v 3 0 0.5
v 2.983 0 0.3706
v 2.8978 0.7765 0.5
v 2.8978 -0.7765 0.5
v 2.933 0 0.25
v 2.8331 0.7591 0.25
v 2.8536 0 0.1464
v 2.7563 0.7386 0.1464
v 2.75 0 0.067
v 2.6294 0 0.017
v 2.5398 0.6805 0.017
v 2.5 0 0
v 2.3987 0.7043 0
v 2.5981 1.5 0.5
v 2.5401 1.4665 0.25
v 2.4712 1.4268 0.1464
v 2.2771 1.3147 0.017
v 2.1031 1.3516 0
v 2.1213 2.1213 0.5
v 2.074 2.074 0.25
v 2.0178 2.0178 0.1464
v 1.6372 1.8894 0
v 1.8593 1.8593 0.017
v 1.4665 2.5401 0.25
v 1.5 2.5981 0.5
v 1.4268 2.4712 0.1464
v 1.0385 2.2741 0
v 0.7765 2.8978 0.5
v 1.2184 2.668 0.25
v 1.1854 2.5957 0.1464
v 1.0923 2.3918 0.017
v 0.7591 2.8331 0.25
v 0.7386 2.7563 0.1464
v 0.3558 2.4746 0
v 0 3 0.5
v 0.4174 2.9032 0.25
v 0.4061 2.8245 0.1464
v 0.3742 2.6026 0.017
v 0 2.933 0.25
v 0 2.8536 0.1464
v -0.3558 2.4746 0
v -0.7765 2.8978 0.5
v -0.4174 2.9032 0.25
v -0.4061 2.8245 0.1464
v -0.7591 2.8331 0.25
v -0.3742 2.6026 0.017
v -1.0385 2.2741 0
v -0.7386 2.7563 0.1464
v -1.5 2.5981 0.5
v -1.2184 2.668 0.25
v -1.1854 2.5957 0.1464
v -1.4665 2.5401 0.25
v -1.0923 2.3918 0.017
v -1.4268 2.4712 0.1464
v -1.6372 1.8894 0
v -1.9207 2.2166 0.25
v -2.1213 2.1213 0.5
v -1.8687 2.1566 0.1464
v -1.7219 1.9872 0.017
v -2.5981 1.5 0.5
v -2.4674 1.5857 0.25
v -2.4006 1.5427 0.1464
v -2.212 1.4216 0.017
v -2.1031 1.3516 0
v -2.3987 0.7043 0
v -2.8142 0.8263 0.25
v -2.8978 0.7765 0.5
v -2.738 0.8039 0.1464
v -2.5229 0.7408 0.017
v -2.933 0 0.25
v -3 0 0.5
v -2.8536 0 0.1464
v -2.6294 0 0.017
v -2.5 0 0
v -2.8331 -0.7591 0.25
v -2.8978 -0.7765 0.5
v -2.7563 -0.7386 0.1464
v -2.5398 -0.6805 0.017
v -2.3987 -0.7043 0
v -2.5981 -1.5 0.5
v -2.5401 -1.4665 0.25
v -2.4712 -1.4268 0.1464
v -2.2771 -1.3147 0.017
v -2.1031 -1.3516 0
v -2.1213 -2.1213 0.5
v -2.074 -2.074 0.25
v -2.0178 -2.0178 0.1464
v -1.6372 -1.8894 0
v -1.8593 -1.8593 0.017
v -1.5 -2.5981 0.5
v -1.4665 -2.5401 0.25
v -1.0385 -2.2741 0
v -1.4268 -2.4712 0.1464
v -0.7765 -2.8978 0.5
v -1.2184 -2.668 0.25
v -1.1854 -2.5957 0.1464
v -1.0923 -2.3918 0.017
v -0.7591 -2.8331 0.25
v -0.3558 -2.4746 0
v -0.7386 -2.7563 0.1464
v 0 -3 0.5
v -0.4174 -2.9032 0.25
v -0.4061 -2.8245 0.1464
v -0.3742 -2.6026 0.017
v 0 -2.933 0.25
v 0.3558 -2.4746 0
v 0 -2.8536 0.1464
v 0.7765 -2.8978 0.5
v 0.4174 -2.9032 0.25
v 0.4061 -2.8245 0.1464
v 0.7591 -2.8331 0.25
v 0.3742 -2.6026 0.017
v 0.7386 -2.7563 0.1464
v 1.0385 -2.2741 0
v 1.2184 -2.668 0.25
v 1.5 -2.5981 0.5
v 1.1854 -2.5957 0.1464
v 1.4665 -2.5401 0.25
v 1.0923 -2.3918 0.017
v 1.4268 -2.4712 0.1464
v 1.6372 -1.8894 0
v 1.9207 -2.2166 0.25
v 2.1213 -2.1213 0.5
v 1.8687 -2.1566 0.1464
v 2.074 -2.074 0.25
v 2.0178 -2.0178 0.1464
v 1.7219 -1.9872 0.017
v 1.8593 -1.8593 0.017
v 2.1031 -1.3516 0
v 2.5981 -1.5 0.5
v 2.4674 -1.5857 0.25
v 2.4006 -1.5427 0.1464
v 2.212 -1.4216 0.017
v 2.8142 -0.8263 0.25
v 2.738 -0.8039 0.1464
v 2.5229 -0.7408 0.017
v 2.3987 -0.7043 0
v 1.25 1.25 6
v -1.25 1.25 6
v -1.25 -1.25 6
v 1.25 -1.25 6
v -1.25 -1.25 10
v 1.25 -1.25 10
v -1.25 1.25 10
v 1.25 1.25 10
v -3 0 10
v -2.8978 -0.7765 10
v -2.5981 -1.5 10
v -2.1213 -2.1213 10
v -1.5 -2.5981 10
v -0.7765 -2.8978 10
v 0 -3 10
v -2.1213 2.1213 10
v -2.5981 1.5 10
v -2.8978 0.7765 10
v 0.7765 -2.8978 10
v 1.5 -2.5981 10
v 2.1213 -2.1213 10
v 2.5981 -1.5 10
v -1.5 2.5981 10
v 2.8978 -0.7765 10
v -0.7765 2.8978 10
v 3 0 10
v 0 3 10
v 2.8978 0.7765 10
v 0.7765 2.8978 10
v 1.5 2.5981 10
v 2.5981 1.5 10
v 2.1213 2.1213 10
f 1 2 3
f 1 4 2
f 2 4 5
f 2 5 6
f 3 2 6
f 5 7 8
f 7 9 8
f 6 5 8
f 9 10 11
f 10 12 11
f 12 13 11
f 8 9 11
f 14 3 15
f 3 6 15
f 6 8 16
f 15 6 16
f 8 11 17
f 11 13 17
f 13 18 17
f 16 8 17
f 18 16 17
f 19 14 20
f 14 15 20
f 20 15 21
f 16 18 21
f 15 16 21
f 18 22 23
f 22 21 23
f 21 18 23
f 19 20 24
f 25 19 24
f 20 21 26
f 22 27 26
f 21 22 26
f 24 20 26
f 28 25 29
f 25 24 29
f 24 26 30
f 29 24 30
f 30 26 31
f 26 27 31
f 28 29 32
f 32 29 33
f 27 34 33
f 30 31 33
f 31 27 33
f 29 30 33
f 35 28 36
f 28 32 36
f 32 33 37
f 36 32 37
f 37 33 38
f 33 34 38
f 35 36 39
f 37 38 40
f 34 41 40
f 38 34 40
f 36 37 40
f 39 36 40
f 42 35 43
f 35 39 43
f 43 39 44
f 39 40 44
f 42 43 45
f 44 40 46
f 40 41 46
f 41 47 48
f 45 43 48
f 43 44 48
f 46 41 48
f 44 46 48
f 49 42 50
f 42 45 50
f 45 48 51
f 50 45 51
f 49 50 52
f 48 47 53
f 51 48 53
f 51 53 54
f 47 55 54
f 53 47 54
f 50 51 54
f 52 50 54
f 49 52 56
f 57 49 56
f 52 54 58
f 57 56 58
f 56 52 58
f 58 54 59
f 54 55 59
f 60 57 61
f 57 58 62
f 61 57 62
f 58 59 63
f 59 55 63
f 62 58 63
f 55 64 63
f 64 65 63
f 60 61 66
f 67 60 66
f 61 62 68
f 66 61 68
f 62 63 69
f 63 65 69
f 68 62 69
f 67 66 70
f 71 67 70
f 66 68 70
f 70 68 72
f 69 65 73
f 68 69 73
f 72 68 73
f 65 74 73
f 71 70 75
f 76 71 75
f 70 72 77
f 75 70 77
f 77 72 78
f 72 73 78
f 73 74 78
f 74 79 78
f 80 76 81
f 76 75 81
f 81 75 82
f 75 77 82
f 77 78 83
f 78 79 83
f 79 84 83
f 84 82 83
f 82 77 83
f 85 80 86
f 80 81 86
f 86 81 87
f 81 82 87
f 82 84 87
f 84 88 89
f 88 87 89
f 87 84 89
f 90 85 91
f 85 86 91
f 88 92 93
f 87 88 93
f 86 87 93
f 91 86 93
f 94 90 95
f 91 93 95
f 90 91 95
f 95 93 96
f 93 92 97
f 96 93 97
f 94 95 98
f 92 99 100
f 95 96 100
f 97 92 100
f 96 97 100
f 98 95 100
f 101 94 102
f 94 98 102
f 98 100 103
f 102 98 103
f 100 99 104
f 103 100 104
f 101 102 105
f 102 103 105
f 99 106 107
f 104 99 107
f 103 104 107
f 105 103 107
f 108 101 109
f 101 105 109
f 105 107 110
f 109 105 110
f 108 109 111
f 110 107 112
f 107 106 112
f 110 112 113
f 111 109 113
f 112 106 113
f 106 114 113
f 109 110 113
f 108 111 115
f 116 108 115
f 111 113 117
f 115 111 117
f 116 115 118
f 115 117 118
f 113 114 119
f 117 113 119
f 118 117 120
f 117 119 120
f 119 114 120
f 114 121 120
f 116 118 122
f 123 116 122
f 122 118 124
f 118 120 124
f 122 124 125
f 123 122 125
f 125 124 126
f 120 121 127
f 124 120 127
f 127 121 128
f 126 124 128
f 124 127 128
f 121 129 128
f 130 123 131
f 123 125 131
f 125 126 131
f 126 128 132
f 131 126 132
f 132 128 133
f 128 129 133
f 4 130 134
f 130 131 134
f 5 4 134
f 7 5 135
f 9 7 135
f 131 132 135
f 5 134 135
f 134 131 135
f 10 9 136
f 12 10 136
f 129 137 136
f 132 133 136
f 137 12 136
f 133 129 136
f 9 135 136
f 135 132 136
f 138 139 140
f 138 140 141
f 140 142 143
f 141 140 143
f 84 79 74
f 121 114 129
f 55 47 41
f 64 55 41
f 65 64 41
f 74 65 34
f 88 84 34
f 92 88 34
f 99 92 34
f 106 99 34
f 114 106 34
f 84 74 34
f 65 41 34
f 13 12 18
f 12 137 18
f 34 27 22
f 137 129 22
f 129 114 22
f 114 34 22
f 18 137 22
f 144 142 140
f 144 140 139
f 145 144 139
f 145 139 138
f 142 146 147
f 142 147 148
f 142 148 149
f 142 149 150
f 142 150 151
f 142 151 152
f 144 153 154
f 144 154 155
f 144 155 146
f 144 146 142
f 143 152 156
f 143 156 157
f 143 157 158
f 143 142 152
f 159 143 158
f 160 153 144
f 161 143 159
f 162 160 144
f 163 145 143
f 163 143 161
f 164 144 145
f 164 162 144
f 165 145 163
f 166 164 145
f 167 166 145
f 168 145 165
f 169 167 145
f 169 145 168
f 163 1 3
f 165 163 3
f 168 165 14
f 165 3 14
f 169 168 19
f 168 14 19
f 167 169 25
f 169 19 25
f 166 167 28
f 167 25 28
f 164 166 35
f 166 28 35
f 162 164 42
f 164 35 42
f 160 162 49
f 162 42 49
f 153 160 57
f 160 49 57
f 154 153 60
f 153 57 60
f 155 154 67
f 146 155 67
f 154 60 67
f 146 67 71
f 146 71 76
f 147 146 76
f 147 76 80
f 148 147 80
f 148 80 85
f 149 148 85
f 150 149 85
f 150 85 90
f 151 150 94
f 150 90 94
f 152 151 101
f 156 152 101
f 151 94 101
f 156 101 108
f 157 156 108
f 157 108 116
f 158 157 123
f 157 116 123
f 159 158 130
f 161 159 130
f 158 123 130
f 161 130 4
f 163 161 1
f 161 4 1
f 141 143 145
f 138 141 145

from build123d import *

# Parameters (mm, degrees)
SKETCH_R     = 3
PAD_DEPTH    = 10
SKETCH001_W  = 2.5
SKETCH001_H  = 2.5
POCKET_DEPTH = 4
FILLET_R     = 0.5


with BuildPart() as part:
    # Sketch → Pad (new body)
    with BuildSketch(Plane.XY):
        Circle(SKETCH_R)
    extrude(amount=PAD_DEPTH)

    # Sketch001 (on Face3 of Pad) → Pocket (cut)
    with BuildSketch(Plane.XY.offset(10)):
        Rectangle(SKETCH001_W, SKETCH001_H)
    extrude(amount=-POCKET_DEPTH, mode=Mode.SUBTRACT)

    # Fillet
    fillet_edges = [part.edges().sort_by_distance(p)[0] for p in [
        (-3, 0, 0),
    ]]
    fillet(fillet_edges, radius=FILLET_R)


solid = part.part
